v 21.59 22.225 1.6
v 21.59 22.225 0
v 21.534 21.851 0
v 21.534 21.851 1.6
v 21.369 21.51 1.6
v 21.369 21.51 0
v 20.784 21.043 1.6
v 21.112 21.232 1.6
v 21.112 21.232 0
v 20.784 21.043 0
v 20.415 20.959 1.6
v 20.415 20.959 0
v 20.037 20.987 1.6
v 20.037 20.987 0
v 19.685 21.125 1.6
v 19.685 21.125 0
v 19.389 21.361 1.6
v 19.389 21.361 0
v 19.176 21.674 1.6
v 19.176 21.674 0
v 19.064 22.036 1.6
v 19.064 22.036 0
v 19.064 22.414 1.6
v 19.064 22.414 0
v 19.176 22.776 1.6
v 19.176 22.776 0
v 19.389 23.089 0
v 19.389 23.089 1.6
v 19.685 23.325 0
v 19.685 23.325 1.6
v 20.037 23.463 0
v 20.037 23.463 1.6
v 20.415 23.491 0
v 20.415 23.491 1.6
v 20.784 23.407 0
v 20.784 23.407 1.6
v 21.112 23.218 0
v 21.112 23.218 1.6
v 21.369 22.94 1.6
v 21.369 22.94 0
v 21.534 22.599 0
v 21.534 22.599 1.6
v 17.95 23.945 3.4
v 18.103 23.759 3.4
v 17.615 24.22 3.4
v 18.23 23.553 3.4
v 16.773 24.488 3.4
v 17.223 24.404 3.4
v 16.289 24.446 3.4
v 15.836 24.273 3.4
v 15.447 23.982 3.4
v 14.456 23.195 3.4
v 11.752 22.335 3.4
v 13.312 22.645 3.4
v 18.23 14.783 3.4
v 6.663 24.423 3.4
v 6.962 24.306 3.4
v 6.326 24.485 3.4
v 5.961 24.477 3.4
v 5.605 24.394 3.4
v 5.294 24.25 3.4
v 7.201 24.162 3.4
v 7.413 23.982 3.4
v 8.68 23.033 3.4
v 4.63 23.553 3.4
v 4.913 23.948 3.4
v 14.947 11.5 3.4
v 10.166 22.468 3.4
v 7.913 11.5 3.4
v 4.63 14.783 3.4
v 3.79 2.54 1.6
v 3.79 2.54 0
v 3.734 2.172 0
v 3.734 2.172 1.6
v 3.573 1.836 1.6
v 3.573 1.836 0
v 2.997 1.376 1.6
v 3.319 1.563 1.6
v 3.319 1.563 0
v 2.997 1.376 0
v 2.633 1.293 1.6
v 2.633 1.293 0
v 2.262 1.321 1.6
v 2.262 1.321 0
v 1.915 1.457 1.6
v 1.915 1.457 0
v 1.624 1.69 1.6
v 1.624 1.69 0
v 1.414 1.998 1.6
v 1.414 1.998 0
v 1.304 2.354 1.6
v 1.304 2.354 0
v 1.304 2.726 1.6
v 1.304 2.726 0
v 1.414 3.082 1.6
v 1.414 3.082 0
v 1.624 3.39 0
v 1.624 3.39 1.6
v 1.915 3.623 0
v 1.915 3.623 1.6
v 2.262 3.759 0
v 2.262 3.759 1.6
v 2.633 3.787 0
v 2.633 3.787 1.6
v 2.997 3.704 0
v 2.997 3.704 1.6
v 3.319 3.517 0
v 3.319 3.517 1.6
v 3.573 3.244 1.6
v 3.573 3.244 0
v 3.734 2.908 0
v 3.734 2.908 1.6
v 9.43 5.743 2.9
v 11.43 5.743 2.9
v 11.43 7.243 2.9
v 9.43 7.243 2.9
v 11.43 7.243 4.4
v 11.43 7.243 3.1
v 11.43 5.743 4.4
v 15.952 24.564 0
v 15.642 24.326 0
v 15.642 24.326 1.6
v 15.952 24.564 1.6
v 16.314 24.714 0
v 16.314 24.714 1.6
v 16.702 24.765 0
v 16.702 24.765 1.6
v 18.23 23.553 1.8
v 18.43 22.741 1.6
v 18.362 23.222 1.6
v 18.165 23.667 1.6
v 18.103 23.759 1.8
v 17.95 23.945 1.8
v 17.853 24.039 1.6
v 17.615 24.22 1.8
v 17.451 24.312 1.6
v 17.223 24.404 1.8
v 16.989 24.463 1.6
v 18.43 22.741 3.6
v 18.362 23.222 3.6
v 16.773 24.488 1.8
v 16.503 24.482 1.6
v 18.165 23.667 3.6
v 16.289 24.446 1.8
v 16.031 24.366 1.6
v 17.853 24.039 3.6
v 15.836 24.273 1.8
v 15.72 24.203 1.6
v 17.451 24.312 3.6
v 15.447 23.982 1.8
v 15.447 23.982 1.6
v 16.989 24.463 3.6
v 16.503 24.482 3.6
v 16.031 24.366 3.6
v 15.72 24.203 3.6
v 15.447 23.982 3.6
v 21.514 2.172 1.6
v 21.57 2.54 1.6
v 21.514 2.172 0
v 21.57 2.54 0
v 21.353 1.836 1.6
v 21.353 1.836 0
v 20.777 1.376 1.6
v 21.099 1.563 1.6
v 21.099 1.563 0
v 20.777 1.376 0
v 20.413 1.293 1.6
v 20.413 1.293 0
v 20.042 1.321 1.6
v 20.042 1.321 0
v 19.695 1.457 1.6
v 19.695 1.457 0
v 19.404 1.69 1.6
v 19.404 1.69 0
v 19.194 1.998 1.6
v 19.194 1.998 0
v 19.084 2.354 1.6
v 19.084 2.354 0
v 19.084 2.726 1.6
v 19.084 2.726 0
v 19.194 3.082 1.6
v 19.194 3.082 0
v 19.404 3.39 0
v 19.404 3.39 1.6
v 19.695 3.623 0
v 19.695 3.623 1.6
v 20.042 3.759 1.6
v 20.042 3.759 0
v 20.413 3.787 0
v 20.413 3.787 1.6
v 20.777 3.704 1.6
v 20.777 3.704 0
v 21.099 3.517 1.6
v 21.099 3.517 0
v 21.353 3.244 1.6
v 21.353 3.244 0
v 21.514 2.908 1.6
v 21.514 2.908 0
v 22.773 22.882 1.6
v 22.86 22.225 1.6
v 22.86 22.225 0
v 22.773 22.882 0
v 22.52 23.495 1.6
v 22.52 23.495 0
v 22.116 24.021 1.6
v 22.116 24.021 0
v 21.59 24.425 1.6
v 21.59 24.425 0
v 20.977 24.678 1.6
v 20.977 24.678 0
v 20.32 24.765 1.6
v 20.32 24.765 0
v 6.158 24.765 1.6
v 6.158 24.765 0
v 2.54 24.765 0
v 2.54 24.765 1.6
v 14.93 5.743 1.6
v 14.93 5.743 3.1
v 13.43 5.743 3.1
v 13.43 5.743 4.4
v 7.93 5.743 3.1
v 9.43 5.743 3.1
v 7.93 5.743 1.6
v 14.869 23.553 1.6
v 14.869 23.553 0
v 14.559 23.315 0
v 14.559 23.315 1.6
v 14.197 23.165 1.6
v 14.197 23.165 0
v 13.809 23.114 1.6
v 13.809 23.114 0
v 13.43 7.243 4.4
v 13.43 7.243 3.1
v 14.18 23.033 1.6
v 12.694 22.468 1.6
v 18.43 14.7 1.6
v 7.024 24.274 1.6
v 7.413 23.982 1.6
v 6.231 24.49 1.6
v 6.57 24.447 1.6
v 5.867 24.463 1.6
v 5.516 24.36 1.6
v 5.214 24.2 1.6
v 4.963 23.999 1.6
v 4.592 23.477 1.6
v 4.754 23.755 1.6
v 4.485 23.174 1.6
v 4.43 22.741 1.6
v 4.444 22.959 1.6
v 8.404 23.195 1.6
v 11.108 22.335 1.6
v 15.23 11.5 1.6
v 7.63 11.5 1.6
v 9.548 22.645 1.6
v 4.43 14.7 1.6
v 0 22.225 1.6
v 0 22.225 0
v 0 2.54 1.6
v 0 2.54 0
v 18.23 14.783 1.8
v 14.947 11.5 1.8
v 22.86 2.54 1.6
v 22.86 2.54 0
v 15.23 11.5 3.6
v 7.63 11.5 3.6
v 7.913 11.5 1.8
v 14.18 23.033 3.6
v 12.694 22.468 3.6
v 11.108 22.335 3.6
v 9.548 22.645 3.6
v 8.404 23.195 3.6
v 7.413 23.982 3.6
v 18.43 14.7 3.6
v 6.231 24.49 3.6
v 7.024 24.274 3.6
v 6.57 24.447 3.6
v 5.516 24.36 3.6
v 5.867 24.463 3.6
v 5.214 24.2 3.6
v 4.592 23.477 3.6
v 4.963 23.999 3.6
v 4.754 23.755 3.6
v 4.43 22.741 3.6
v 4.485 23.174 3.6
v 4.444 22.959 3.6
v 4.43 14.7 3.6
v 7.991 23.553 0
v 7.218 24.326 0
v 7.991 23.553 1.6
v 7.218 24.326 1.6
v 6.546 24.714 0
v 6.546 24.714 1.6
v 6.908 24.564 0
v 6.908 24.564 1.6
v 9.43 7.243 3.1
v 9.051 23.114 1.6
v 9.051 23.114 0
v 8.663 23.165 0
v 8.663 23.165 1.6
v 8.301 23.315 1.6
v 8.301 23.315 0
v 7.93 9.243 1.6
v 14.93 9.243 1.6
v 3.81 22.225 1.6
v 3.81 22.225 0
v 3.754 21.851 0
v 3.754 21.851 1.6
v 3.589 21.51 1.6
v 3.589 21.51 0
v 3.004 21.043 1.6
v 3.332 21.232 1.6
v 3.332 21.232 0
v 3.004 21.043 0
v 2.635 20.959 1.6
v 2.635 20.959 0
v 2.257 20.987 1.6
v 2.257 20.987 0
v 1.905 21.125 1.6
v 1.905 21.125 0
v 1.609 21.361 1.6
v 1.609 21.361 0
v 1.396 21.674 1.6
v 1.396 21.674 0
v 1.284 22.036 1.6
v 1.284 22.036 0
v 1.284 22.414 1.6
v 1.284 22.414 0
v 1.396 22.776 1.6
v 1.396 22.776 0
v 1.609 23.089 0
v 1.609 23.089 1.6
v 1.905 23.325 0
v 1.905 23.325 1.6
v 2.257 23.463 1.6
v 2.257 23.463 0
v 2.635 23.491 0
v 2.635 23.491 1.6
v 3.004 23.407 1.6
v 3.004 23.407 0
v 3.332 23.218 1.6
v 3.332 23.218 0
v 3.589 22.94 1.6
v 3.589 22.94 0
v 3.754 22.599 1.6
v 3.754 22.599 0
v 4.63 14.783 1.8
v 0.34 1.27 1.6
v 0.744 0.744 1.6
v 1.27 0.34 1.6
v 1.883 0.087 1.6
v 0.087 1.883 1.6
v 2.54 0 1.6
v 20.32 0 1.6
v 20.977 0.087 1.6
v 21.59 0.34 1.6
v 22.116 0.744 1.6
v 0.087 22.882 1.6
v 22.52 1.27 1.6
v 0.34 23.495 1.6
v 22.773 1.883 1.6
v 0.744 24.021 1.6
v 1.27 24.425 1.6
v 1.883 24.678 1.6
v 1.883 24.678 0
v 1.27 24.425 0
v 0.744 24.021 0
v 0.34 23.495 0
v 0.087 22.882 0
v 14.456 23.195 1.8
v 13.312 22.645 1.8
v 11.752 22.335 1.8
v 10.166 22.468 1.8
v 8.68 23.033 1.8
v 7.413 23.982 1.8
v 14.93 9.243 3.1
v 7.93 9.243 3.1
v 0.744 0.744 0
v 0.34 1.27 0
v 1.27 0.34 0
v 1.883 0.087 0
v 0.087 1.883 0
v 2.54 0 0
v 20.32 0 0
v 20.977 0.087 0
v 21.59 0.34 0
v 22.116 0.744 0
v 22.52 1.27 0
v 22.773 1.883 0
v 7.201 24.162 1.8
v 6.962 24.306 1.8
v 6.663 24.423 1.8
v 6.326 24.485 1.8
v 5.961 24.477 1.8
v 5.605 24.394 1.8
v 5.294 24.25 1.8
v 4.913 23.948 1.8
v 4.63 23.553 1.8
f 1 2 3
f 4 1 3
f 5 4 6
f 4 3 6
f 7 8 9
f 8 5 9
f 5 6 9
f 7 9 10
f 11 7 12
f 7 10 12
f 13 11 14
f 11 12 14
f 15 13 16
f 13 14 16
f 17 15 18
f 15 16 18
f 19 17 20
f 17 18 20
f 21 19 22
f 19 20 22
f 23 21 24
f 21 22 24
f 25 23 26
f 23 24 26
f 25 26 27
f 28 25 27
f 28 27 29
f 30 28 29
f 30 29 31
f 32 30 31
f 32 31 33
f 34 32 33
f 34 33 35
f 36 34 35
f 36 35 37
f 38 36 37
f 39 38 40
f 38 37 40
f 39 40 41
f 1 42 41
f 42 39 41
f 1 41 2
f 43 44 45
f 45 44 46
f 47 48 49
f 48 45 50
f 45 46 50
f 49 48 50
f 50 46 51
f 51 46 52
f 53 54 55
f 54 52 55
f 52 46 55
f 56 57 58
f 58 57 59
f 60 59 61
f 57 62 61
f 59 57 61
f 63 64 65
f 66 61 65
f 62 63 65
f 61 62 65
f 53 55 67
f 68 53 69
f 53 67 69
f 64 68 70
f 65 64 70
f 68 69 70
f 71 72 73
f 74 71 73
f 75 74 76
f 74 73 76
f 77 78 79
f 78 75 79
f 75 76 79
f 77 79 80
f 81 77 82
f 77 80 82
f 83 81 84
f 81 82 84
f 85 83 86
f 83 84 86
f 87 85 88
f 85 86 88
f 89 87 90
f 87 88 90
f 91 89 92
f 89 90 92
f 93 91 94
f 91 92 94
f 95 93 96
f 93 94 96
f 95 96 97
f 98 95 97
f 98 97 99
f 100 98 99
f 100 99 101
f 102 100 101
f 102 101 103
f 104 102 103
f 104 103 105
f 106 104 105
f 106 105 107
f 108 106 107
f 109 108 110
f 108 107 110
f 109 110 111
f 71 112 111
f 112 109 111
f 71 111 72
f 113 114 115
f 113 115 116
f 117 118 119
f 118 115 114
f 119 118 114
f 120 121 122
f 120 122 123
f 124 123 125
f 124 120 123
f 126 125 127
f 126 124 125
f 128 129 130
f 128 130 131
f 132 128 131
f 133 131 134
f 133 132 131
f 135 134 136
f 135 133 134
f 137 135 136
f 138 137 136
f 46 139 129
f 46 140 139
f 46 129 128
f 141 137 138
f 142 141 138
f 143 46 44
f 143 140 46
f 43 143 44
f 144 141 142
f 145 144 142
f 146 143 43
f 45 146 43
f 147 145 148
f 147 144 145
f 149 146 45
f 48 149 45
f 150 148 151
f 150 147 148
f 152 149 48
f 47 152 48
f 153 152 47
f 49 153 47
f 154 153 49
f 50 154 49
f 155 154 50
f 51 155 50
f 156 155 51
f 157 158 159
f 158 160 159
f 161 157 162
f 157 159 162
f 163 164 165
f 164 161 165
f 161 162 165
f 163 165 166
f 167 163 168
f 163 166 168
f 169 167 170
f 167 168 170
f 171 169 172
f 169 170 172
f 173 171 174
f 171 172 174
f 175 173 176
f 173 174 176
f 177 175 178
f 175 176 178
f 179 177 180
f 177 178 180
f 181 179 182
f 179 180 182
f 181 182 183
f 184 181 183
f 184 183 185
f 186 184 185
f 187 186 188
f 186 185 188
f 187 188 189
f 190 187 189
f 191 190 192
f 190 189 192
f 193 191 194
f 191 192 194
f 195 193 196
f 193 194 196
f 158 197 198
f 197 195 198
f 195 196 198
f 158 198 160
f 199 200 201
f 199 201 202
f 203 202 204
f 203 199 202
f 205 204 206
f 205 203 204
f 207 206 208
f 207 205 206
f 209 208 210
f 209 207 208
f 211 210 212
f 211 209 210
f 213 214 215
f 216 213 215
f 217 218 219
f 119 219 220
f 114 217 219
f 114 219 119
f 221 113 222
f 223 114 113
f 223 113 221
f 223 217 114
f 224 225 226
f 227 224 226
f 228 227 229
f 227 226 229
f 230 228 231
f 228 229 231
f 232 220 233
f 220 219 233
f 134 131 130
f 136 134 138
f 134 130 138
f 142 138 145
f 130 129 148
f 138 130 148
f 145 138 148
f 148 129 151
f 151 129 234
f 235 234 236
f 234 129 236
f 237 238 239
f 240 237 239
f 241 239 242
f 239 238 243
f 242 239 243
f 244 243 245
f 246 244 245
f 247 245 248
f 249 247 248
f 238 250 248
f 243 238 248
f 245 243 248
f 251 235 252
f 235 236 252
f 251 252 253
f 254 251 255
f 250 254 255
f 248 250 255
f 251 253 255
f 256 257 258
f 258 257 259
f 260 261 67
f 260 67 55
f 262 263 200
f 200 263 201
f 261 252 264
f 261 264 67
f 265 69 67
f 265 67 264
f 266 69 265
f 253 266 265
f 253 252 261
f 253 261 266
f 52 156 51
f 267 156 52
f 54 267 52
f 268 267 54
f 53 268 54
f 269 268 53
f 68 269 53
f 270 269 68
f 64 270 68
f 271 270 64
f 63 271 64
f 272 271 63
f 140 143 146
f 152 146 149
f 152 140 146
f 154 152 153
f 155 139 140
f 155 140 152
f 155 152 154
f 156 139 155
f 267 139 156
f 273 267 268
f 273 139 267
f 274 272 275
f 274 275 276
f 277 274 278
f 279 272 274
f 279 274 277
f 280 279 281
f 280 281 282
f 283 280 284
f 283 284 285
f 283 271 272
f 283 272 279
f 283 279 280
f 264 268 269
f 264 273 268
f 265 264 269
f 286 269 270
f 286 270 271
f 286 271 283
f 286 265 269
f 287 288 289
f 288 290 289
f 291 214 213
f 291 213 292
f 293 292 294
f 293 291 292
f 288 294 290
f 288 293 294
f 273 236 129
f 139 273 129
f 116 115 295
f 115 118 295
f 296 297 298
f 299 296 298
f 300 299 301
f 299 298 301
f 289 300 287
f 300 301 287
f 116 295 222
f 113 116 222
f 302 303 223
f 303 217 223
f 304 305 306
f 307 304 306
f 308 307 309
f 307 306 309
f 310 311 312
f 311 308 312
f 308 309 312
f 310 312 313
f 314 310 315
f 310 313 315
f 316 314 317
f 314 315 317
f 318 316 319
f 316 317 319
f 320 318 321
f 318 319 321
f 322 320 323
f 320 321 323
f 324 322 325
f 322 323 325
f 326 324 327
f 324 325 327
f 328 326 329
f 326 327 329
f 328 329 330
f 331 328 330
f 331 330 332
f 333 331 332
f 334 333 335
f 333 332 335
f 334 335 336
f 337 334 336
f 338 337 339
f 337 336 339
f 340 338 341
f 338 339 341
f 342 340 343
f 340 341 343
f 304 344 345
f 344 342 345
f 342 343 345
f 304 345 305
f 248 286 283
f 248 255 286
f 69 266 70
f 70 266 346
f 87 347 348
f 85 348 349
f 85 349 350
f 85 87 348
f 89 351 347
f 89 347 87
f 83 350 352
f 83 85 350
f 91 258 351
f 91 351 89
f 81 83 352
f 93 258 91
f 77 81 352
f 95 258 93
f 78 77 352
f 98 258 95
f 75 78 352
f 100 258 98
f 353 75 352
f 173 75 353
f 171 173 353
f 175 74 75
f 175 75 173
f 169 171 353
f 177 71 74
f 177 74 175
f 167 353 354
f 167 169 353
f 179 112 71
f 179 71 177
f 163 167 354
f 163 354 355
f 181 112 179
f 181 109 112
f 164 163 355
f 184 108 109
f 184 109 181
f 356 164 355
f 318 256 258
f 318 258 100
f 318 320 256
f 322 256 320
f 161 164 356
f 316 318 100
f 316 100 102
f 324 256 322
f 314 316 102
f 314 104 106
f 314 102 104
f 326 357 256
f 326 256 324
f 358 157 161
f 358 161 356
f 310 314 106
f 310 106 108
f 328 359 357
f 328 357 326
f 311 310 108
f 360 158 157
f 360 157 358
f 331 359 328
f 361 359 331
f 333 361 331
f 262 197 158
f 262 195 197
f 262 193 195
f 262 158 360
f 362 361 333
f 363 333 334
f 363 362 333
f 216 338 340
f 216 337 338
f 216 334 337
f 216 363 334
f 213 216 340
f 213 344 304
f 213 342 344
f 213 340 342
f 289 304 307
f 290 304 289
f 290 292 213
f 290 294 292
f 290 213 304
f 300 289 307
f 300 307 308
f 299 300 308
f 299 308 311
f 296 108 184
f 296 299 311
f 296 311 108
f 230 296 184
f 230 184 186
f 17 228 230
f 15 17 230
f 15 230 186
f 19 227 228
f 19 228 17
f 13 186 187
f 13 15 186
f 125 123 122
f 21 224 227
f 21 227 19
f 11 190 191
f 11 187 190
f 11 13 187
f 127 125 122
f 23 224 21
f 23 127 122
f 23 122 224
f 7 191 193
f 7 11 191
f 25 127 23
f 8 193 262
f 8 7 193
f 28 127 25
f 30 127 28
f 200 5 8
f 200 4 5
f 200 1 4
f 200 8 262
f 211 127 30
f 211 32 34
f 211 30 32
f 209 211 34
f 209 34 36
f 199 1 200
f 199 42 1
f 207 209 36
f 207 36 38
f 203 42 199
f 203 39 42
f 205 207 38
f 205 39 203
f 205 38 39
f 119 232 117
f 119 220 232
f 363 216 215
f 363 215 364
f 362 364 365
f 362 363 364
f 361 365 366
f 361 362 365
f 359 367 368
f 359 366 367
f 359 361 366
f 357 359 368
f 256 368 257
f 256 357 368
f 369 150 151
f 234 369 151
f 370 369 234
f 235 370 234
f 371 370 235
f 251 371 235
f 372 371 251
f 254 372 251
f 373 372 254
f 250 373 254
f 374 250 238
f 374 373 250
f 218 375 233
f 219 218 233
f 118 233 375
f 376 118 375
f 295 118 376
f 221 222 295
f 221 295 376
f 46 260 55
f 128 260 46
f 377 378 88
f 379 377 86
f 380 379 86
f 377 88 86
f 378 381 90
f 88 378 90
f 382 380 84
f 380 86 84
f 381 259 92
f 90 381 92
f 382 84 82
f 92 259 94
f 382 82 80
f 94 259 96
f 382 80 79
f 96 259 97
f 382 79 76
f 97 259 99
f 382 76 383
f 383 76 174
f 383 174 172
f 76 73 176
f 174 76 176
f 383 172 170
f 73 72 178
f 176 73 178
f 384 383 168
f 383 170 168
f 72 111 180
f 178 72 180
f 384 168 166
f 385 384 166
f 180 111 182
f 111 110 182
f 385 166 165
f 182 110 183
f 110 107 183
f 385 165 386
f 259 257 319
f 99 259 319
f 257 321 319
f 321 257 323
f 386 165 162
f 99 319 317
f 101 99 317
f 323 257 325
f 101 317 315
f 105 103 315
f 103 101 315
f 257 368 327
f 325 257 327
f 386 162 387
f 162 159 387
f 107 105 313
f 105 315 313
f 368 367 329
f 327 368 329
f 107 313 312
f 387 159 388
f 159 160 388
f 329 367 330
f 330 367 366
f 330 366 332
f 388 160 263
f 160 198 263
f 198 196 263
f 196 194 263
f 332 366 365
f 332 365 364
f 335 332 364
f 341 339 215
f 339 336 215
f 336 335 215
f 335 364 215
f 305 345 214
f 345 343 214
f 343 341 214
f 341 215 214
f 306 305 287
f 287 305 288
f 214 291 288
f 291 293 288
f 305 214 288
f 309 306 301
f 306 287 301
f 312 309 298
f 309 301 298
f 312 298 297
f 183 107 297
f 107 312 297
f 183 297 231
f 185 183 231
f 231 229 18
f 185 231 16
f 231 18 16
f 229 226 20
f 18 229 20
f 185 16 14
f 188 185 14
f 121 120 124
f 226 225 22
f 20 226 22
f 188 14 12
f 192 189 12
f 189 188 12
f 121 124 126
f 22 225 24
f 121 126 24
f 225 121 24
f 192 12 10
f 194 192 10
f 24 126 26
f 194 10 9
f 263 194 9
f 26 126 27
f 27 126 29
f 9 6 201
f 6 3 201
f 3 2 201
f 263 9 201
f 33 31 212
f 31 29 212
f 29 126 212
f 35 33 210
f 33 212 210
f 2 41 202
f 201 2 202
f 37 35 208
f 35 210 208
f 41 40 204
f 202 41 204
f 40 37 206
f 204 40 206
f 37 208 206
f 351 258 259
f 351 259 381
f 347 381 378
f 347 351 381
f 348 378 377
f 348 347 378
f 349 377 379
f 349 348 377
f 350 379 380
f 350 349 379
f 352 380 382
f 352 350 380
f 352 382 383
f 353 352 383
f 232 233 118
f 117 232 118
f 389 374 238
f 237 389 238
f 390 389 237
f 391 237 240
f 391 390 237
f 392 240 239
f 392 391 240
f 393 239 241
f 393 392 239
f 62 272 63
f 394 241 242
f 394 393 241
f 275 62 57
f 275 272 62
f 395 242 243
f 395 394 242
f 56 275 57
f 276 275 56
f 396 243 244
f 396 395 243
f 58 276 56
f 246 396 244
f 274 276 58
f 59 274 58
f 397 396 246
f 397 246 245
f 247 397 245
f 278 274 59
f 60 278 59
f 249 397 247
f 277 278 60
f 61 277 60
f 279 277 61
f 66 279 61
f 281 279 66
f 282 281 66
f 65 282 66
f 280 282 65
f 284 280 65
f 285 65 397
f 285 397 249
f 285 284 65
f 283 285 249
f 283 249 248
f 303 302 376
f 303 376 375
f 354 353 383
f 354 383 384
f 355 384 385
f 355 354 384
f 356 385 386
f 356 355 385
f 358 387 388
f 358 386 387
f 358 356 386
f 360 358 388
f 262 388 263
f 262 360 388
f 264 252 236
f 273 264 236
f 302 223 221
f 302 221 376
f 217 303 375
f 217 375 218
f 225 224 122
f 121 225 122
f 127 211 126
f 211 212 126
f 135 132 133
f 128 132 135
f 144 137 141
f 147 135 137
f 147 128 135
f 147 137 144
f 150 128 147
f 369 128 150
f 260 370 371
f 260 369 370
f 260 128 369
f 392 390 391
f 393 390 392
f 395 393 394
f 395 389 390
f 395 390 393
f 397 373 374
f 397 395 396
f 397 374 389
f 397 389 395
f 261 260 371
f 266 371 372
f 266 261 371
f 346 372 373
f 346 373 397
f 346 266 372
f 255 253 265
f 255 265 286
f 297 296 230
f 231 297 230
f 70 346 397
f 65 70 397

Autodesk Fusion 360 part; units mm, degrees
sketch "PCB" plane through (0, 0, 0) normal (0, 0, 1) x (1, 0, 0)
  line L0 (0, 0) -> (22.86, 0)
  line L1 (22.86, 0) -> (22.86, 24.765)
  line L2 (22.86, 24.765) -> (0, 24.765)
  line L3 (0, 24.765) -> (0, 0)
  circle A0 centre (2.54, 2.54) radius 1.25
  circle A1 centre (20.32, 2.54) radius 1.25
  circle A2 centre (2.54, 22.225) radius 1.27
  circle A3 centre (20.32, 22.225) radius 1.27
  dimension "d1" = 22.86
  dimension "d2" = 24.765
  dimension "d3" = 2.5
  dimension "d4" = 2.54
  dimension "d5" = 2.54
  dimension "d6" = 2.5
  dimension "d8" = 2.54
  dimension "d9" = 20.32
  dimension "d10" = 2.54
  dimension "d11" = 22.225
  dimension "d12" = 2.54
  dimension "d13" = 2.54
  dimension "d15" = 20.32
  dimension "d16" = 22.225
extrude "Extrude1" add sketch "PCB" along normal blind 1.6 makes body 1
fillet "Fillet1" radius 2.54 4 edges at (0, 0, 0.8) (0, 24.765, 0.8) (22.86, 24.765, 0.8) (22.86, 0, 0.8) on bodies 1
sketch "battery cut" plane through (0, 0, 1.6) normal (0, 0, 1) x (-1, 0, 0)
  arc A0 (-20.32, 0) -> (-22.86, -2.54) centre (-20.32, -2.54) ccw
  line L0 (-22.86, -2.54) -> (-22.86, -22.225)
  arc A1 (-22.86, -22.225) -> (-20.32, -24.765) centre (-20.32, -22.225) ccw
  line L1 (-20.32, -24.765) -> (-2.54, -24.765)
  arc A2 (-2.54, -24.765) -> (0, -22.225) centre (-2.54, -22.225) ccw
  line L2 (0, -22.225) -> (0, -2.54)
  arc A3 (0, -2.54) -> (-2.54, 0) centre (-2.54, -2.54) ccw
  line L3 (-2.54, 0) -> (-20.32, 0)
  circle A4 centre (-2.54, -2.54) radius 1.25
  circle A5 centre (-2.54, -22.225) radius 1.27
  circle A6 centre (-20.32, -2.54) radius 1.25
  circle A7 centre (-20.32, -22.225) radius 1.27
  line L4 (-11.43, -24.765) -> (-11.43, 0) construction
  line L5 (-6.779, -24.765) -> (-8.43, -23.114)
  line L6 (-8.43, -23.114) -> (-14.43, -23.114)
  line L7 (-14.43, -23.114) -> (-16.081, -24.765)
  line L8 (-11.43, -23.114) -> (-11.43, -24.765) construction
  dimension "d20" = 6
  dimension "d21" = 135
  dimension "d22" = 135
  dimension "d26" = 23.114
extrude "Extrude2" cut sketch "battery cut" against normal up to surface (1.6 mm away) contours L1 L5 L6 L7 bodies 1
fillet "Fillet2" radius 1.5 4 edges at (14.43, 23.114, 0.8) (16.081, 24.765, 0.8) (8.43, 23.114, 0.8) (6.779, 24.765, 0.8) on bodies 1
sketch "switch" plane through (0, 0, 1.6) normal (0, 0, 1) x (-1, 0, 0)
  circle A0 centre (-20.32, -22.225) radius 1.27
  circle A1 centre (-20.32, -2.54) radius 1.25
  circle A2 centre (-2.54, -22.225) radius 1.27
  circle A3 centre (-2.54, -2.54) radius 1.25
  arc A4 (-7.2183, -24.3257) -> (-6.1577, -24.765) centre (-6.1577, -23.265) ccw
  line L0 (-6.1577, -24.765) -> (-2.54, -24.765)
  arc A5 (-2.54, -24.765) -> (0, -22.225) centre (-2.54, -22.225) ccw
  line L1 (0, -22.225) -> (0, -2.54)
  arc A6 (0, -2.54) -> (-2.54, 0) centre (-2.54, -2.54) ccw
  line L2 (-2.54, 0) -> (-20.32, 0)
  arc A7 (-20.32, 0) -> (-22.86, -2.54) centre (-20.32, -2.54) ccw
  line L3 (-22.86, -2.54) -> (-22.86, -22.225)
  arc A8 (-22.86, -22.225) -> (-20.32, -24.765) centre (-20.32, -22.225) ccw
  line L4 (-20.32, -24.765) -> (-16.7023, -24.765)
  arc A9 (-16.7023, -24.765) -> (-15.6417, -24.3257) centre (-16.7023, -23.265) ccw
  line L5 (-15.6417, -24.3257) -> (-14.8693, -23.5533)
  arc A10 (-13.8087, -23.114) -> (-14.8693, -23.5533) centre (-13.8087, -24.614) ccw
  line L6 (-13.8087, -23.114) -> (-9.0513, -23.114)
  arc A11 (-7.9907, -23.5533) -> (-9.0513, -23.114) centre (-9.0513, -24.614) ccw
  line L7 (-7.9907, -23.5533) -> (-7.2183, -24.3257)
  line L8 (-11.43, 0) -> (-11.43, -23.114) construction
  line L9 (-14.93, -5.743) -> (-7.93, -5.743)
  line L10 (-7.93, -5.743) -> (-7.93, -9.243)
  line L11 (-7.93, -9.243) -> (-14.93, -9.243)
  line L12 (-14.93, -9.243) -> (-14.93, -5.743)
  line L13 (-14.93, -5.743) -> (-7.93, -9.243) construction
  line L14 (-7.93, -5.743) -> (-14.93, -9.243) construction
  point P0 (-11.43, -7.493)
  dimension "d27" = 7
  dimension "d28" = 3.5
  dimension "d29" = 7.493
extrude "Extrude3" add sketch "switch" along normal blind 1.5 separate body contours L9 L10 L11 L12 makes body 2
sketch "actuator" plane through (0, 0, 3.1) normal (0, 0, 1) x (-1, 0, 0)
  line L0 (-14.93, -9.243) -> (-7.93, -9.243)
  line L1 (-7.93, -9.243) -> (-7.93, -5.743)
  line L2 (-7.93, -5.743) -> (-14.93, -5.743)
  line L3 (-14.93, -5.743) -> (-14.93, -9.243)
  line L4 (-11.43, -9.243) -> (-11.43, -5.743)
  line L5 (-9.43, -5.743) -> (-13.43, -5.743)
  line L6 (-13.43, -5.743) -> (-13.43, -7.243)
  line L7 (-13.43, -7.243) -> (-9.43, -7.243)
  line L8 (-9.43, -7.243) -> (-9.43, -5.743)
  dimension "d32" = 1.5
  dimension "d33" = 1.5
  dimension "d34" = 1.5
extrude "Extrude5" cut sketch "actuator" against normal blind 0.2 contours L2 L4 L5 L6 L7 | L2 L4 L5 L7 L8 bodies 2
extrude "Extrude6" add sketch "actuator" along normal blind 1.5 from surface at -0.2 contours L2 L4 L5 L6 L7 bodies 2
sketch "battery holder" plane through (0, 0, 1.6) normal (0, 0, 1) x (-1, 0, 0)
  circle A0 centre (-20.32, -22.225) radius 1.27
  circle A1 centre (-20.32, -2.54) radius 1.25
  circle A2 centre (-2.54, -22.225) radius 1.27
  circle A3 centre (-2.54, -2.54) radius 1.25
  arc A4 (-7.2183, -24.3257) -> (-6.1577, -24.765) centre (-6.1577, -23.265) ccw
  line L0 (-6.1577, -24.765) -> (-2.54, -24.765)
  arc A5 (-2.54, -24.765) -> (0, -22.225) centre (-2.54, -22.225) ccw
  line L1 (0, -22.225) -> (0, -2.54)
  arc A6 (0, -2.54) -> (-2.54, 0) centre (-2.54, -2.54) ccw
  line L2 (-2.54, 0) -> (-20.32, 0)
  arc A7 (-20.32, 0) -> (-22.86, -2.54) centre (-20.32, -2.54) ccw
  line L3 (-22.86, -2.54) -> (-22.86, -22.225)
  arc A8 (-22.86, -22.225) -> (-20.32, -24.765) centre (-20.32, -22.225) ccw
  line L4 (-20.32, -24.765) -> (-16.7023, -24.765)
  arc A9 (-16.7023, -24.765) -> (-15.6417, -24.3257) centre (-16.7023, -23.265) ccw
  line L5 (-15.6417, -24.3257) -> (-14.8693, -23.5533)
  arc A10 (-13.8087, -23.114) -> (-14.8693, -23.5533) centre (-13.8087, -24.614) ccw
  line L6 (-13.8087, -23.114) -> (-9.0513, -23.114)
  arc A11 (-7.9907, -23.5533) -> (-9.0513, -23.114) centre (-9.0513, -24.614) ccw
  line L7 (-7.9907, -23.5533) -> (-7.2183, -24.3257)
  line L8 (-11.43, -23.114) -> (-11.43, 0) construction
  line L9 (-4.43, -24.565) -> (-6.83, -24.565)
  line L10 (-6.83, -24.565) -> (-9.095, -22.3)
  line L11 (-9.095, -22.3) -> (-11.43, -22.3)
  line L12 (-11.43, -11.5) -> (-7.63, -11.5)
  line L13 (-7.63, -11.5) -> (-4.43, -14.7)
  line L14 (-4.43, -14.7) -> (-4.43, -24.565)
  line L15 (-11.43, -11.5) -> (-15.23, -11.5)
  line L16 (-15.23, -11.5) -> (-18.43, -14.7)
  line L17 (-18.43, -14.7) -> (-18.43, -24.565)
  line L18 (-18.43, -24.565) -> (-16.03, -24.565)
  line L19 (-16.03, -24.565) -> (-13.765, -22.3)
  line L20 (-13.765, -22.3) -> (-11.43, -22.3)
  dimension "d42" = 3.8
  dimension "d44" = 135
  dimension "d46" = 10.8
  dimension "d47" = 11.5
  dimension "d49" = 135
  dimension "d51" = 7
  dimension "d57" = 2.4
  dimension "d58" = 0.2
extrude "Extrude8" add sketch "battery holder" along normal blind 2 separate body contours L9 L10 L11 L12 L13 L14 L15 L16 L17 L18 L19 L20 makes body 3
fillet "Fillet5" radius 5.7 2 edges at (13.765, 22.3, 2.6) (9.095, 22.3, 2.6) on bodies 3
fillet "Fillet6" radius 1.75 4 edges at (18.43, 24.565, 2.6) (16.03, 24.565, 2.6) (6.83, 24.565, 2.6) (4.43, 24.565, 2.6) on bodies 3
shell "Shell1" thickness 0.2 removed faces 4 at (12.6967, 11.5, 2.2667) at (17.6818, 24.1757, 2.2667) at (12.2572, 22.3859, 2.2667) at (4.8091, 23.8287, 2.9333) on bodies 3
equation "d42 = ( 7.6 / 2 ) * 1 mm"
